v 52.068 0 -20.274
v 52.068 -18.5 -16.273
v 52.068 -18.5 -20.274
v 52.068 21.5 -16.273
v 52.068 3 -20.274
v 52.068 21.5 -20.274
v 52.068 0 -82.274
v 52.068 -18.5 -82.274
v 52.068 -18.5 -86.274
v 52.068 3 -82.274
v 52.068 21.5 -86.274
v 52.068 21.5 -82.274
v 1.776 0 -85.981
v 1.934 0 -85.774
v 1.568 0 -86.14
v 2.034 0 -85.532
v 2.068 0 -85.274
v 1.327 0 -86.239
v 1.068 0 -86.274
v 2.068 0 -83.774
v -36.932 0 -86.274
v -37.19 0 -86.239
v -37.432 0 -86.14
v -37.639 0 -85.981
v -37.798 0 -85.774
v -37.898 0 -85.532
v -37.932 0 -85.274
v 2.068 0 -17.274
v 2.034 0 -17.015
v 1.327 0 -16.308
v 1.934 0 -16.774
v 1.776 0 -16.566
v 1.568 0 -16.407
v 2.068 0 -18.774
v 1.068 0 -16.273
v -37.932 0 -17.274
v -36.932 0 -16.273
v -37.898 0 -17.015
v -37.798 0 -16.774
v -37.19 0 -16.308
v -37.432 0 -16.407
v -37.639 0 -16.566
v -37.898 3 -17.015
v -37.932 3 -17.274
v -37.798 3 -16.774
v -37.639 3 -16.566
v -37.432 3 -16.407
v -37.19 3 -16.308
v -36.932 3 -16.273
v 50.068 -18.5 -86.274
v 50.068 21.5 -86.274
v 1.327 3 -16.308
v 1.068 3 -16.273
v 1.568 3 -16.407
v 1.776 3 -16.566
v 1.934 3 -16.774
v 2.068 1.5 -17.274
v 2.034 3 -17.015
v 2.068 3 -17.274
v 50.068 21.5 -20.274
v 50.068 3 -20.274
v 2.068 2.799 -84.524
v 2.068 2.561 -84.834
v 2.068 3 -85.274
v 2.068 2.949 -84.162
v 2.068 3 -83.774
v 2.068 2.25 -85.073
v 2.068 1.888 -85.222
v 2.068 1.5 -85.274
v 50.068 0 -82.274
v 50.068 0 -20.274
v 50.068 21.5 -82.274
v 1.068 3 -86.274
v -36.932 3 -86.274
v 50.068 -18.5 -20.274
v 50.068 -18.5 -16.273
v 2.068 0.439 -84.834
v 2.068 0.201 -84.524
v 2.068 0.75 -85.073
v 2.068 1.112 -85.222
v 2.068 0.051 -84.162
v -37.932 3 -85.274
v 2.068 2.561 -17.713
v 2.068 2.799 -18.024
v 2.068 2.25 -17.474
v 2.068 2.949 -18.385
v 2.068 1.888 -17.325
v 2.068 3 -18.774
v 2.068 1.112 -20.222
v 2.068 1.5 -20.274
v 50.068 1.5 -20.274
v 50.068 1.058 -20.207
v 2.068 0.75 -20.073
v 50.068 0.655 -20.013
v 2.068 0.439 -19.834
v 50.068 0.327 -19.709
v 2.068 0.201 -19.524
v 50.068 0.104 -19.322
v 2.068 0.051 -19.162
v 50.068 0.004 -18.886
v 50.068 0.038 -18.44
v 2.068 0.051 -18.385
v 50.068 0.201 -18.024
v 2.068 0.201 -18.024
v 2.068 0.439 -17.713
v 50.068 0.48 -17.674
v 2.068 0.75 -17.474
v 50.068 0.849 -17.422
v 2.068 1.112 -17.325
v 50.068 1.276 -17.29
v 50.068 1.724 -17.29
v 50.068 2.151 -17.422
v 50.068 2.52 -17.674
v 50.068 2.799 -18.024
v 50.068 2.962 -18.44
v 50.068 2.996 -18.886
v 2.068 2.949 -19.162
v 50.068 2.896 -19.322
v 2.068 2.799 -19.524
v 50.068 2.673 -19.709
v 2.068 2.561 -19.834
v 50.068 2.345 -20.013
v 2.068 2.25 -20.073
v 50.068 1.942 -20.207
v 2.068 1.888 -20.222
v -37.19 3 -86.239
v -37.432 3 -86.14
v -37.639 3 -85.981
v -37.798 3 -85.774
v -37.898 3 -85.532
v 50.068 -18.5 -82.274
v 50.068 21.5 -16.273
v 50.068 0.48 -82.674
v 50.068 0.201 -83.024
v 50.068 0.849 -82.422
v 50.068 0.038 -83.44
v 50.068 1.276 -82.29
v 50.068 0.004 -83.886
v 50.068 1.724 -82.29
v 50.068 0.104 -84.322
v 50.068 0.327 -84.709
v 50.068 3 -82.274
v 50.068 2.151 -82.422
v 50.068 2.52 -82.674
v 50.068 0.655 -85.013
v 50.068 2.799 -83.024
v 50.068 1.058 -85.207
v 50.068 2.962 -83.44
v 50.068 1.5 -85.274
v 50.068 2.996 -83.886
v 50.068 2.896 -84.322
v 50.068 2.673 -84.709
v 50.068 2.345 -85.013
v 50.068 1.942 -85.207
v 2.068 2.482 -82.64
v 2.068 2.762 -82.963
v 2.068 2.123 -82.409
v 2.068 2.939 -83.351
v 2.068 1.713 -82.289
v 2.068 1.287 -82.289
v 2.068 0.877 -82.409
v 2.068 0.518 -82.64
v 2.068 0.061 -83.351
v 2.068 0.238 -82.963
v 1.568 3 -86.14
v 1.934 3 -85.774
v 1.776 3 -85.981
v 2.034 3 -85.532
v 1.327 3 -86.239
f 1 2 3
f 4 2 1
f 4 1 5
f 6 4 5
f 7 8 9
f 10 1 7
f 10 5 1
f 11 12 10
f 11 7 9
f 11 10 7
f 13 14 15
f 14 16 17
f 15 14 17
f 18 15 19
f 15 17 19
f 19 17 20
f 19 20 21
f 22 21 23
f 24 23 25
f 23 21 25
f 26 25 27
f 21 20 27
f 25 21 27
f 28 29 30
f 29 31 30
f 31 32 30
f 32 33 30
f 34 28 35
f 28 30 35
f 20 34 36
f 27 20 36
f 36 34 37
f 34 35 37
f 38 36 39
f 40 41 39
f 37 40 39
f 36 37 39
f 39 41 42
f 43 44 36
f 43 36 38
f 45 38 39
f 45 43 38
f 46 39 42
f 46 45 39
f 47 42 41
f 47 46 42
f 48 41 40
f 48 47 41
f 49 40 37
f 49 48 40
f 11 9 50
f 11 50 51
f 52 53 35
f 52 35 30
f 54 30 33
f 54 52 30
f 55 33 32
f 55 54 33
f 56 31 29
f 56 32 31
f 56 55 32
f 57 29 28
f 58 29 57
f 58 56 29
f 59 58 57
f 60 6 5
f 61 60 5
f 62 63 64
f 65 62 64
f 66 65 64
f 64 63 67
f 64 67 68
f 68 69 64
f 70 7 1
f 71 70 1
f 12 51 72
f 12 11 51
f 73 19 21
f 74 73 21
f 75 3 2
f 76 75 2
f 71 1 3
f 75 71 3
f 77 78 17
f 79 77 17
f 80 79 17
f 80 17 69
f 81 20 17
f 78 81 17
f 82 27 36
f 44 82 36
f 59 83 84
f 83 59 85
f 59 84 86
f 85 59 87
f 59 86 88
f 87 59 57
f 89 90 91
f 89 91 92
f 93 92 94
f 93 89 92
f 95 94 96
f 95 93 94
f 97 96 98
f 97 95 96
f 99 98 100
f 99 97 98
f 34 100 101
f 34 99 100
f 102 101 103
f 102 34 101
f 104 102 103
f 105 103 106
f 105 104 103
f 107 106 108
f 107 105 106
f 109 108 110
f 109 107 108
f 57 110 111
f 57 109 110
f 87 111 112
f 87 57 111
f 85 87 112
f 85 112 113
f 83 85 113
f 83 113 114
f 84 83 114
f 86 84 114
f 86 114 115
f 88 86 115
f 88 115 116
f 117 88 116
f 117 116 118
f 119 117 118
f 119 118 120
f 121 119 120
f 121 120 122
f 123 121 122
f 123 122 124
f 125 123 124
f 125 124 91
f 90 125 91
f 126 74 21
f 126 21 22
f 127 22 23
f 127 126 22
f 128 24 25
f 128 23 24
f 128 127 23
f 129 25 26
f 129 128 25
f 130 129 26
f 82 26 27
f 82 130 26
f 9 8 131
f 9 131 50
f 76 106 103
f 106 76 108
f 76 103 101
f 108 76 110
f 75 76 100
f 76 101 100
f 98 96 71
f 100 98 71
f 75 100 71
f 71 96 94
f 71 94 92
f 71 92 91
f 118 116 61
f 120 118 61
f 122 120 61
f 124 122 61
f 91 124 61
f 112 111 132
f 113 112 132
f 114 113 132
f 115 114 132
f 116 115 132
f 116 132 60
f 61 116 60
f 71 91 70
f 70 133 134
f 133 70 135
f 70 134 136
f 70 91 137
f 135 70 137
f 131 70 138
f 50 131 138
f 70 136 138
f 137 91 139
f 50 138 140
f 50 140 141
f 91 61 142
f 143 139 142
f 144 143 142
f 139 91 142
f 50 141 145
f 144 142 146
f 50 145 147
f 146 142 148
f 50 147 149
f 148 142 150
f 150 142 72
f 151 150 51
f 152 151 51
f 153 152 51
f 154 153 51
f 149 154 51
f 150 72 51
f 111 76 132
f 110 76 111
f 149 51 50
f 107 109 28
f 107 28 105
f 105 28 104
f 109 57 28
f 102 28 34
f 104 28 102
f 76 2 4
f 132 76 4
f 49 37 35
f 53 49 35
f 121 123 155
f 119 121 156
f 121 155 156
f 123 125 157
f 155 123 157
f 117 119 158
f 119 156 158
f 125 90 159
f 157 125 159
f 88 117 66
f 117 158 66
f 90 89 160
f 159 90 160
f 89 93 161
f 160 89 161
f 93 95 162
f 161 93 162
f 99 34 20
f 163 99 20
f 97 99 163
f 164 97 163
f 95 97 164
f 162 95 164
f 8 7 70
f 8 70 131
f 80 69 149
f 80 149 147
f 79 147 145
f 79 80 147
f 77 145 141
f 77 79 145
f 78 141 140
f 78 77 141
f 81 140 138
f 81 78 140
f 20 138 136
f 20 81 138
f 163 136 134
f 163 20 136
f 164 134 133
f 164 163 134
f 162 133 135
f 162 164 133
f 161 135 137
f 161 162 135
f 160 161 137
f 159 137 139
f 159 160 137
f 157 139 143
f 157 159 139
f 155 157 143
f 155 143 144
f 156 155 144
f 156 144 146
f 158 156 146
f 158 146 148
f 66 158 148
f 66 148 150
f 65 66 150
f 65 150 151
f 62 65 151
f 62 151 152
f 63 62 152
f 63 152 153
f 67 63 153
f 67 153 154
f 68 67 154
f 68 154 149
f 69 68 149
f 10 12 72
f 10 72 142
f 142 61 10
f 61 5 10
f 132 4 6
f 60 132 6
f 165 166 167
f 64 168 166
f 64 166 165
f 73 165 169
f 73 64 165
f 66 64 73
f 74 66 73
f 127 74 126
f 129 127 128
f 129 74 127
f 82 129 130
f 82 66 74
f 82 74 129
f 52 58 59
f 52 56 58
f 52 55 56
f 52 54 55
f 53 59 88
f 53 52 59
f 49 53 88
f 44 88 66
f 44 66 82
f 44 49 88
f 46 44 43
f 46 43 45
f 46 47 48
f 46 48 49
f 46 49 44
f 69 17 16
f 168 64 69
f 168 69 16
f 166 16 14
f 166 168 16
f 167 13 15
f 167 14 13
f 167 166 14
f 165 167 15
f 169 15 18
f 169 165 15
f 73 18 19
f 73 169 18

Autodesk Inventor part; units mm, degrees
ref_plane "YZ Plane" through (0, 0, 0) normal (1, 0, 0) x (0, 1, 0)
ref_plane "XZ Plane" through (0, 0, 0) normal (0, 1, 0) x (-1, 0, 0)
ref_plane "XY Plane" through (0, 0, 0) normal (0, 0, 1) x (1, 0, 0)
sketch "Skizze1" plane through (0, 0, 0) normal (0, 1, 0) x (-1, 0, 0)
  line L0 (37.9316, -16.2735) -> (-2.0684, -16.2735)
  line L1 (-2.0684, -16.2735) -> (-2.0684, -86.2735)
  line L2 (-2.0684, -86.2735) -> (37.9316, -86.2735)
  line L3 (37.9316, -86.2735) -> (37.9316, -16.2735)
  point P0 (0, 0)
  dimension "d0" = 70
  dimension "d1" = 40
extrude "Extrusion1" add sketch "Skizze1" along normal blind 3
fillet "Rundung1" radius 1 4 edges at (-37.9316, 1.5, -16.2735) (-37.9316, 1.5, -86.2735) (2.0684, 1.5, -86.2735) (2.0684, 1.5, -16.2735)
sketch "Skizze2" plane through (2.0684, 0, -17.2735) normal (1, 0, 0) x (0, 0, -1)
  circle A0 centre (1.5, 1.5) radius 1.5
  circle A1 centre (66.5, 1.5) radius 1.5
  line L0 (0, 3) -> (68, 3) projected
  line L1 (0, 0) -> (0, 3) projected
  line L2 (68, 3) -> (68, 0) projected
  point P0 (-17.2735, 0)
  dimension "d5" = 3
  dimension "d6" = 3
  dimension "d7" = 1.5
  dimension "d8" = 1.5
  dimension "d9" = 1.5
  dimension "d10" = 1.5
extrude "Extrusion2" add sketch "Skizze2" along normal blind 50 contours A0 | A1
sketch "Skizze3" plane through (52.0684, 1.5, -18.7735) normal (1, 0, 0) x (0, 0, -1)
  line L0 (-2.5, 1.5) -> (67.5, 1.5)
  line L1 (67.5, 1.5) -> (67.5, -1.5)
  line L2 (67.5, -1.5) -> (-2.5, -1.5)
  line L3 (-2.5, -1.5) -> (-2.5, 1.5)
  circle A0 centre (0, 0) radius 1.5 projected
  circle A1 centre (65, 0) radius 1.5 projected
  line L4 (-2.5, 20) -> (1.5, 20)
  line L5 (1.5, 20) -> (1.5, -20)
  line L6 (1.5, -20) -> (-2.5, -20)
  line L7 (-2.5, -20) -> (-2.5, 20)
  line L8 (67.5, 20) -> (63.5, 20)
  line L9 (63.5, 20) -> (63.5, -20)
  line L10 (63.5, -20) -> (67.5, -20)
  line L11 (67.5, -20) -> (67.5, 20)
  point P0 (-18.7735, -1.5)
  dimension "d13" = 1.5
  dimension "d14" = 1.5
  dimension "d16" = 2.5
  dimension "d17" = 2.5
  dimension "d20" = 40
  dimension "d21" = 20
extrude "Extrusion4" add sketch "Skizze3" against normal blind 2
properties part number "Spielstraßenschild_gesamt"
